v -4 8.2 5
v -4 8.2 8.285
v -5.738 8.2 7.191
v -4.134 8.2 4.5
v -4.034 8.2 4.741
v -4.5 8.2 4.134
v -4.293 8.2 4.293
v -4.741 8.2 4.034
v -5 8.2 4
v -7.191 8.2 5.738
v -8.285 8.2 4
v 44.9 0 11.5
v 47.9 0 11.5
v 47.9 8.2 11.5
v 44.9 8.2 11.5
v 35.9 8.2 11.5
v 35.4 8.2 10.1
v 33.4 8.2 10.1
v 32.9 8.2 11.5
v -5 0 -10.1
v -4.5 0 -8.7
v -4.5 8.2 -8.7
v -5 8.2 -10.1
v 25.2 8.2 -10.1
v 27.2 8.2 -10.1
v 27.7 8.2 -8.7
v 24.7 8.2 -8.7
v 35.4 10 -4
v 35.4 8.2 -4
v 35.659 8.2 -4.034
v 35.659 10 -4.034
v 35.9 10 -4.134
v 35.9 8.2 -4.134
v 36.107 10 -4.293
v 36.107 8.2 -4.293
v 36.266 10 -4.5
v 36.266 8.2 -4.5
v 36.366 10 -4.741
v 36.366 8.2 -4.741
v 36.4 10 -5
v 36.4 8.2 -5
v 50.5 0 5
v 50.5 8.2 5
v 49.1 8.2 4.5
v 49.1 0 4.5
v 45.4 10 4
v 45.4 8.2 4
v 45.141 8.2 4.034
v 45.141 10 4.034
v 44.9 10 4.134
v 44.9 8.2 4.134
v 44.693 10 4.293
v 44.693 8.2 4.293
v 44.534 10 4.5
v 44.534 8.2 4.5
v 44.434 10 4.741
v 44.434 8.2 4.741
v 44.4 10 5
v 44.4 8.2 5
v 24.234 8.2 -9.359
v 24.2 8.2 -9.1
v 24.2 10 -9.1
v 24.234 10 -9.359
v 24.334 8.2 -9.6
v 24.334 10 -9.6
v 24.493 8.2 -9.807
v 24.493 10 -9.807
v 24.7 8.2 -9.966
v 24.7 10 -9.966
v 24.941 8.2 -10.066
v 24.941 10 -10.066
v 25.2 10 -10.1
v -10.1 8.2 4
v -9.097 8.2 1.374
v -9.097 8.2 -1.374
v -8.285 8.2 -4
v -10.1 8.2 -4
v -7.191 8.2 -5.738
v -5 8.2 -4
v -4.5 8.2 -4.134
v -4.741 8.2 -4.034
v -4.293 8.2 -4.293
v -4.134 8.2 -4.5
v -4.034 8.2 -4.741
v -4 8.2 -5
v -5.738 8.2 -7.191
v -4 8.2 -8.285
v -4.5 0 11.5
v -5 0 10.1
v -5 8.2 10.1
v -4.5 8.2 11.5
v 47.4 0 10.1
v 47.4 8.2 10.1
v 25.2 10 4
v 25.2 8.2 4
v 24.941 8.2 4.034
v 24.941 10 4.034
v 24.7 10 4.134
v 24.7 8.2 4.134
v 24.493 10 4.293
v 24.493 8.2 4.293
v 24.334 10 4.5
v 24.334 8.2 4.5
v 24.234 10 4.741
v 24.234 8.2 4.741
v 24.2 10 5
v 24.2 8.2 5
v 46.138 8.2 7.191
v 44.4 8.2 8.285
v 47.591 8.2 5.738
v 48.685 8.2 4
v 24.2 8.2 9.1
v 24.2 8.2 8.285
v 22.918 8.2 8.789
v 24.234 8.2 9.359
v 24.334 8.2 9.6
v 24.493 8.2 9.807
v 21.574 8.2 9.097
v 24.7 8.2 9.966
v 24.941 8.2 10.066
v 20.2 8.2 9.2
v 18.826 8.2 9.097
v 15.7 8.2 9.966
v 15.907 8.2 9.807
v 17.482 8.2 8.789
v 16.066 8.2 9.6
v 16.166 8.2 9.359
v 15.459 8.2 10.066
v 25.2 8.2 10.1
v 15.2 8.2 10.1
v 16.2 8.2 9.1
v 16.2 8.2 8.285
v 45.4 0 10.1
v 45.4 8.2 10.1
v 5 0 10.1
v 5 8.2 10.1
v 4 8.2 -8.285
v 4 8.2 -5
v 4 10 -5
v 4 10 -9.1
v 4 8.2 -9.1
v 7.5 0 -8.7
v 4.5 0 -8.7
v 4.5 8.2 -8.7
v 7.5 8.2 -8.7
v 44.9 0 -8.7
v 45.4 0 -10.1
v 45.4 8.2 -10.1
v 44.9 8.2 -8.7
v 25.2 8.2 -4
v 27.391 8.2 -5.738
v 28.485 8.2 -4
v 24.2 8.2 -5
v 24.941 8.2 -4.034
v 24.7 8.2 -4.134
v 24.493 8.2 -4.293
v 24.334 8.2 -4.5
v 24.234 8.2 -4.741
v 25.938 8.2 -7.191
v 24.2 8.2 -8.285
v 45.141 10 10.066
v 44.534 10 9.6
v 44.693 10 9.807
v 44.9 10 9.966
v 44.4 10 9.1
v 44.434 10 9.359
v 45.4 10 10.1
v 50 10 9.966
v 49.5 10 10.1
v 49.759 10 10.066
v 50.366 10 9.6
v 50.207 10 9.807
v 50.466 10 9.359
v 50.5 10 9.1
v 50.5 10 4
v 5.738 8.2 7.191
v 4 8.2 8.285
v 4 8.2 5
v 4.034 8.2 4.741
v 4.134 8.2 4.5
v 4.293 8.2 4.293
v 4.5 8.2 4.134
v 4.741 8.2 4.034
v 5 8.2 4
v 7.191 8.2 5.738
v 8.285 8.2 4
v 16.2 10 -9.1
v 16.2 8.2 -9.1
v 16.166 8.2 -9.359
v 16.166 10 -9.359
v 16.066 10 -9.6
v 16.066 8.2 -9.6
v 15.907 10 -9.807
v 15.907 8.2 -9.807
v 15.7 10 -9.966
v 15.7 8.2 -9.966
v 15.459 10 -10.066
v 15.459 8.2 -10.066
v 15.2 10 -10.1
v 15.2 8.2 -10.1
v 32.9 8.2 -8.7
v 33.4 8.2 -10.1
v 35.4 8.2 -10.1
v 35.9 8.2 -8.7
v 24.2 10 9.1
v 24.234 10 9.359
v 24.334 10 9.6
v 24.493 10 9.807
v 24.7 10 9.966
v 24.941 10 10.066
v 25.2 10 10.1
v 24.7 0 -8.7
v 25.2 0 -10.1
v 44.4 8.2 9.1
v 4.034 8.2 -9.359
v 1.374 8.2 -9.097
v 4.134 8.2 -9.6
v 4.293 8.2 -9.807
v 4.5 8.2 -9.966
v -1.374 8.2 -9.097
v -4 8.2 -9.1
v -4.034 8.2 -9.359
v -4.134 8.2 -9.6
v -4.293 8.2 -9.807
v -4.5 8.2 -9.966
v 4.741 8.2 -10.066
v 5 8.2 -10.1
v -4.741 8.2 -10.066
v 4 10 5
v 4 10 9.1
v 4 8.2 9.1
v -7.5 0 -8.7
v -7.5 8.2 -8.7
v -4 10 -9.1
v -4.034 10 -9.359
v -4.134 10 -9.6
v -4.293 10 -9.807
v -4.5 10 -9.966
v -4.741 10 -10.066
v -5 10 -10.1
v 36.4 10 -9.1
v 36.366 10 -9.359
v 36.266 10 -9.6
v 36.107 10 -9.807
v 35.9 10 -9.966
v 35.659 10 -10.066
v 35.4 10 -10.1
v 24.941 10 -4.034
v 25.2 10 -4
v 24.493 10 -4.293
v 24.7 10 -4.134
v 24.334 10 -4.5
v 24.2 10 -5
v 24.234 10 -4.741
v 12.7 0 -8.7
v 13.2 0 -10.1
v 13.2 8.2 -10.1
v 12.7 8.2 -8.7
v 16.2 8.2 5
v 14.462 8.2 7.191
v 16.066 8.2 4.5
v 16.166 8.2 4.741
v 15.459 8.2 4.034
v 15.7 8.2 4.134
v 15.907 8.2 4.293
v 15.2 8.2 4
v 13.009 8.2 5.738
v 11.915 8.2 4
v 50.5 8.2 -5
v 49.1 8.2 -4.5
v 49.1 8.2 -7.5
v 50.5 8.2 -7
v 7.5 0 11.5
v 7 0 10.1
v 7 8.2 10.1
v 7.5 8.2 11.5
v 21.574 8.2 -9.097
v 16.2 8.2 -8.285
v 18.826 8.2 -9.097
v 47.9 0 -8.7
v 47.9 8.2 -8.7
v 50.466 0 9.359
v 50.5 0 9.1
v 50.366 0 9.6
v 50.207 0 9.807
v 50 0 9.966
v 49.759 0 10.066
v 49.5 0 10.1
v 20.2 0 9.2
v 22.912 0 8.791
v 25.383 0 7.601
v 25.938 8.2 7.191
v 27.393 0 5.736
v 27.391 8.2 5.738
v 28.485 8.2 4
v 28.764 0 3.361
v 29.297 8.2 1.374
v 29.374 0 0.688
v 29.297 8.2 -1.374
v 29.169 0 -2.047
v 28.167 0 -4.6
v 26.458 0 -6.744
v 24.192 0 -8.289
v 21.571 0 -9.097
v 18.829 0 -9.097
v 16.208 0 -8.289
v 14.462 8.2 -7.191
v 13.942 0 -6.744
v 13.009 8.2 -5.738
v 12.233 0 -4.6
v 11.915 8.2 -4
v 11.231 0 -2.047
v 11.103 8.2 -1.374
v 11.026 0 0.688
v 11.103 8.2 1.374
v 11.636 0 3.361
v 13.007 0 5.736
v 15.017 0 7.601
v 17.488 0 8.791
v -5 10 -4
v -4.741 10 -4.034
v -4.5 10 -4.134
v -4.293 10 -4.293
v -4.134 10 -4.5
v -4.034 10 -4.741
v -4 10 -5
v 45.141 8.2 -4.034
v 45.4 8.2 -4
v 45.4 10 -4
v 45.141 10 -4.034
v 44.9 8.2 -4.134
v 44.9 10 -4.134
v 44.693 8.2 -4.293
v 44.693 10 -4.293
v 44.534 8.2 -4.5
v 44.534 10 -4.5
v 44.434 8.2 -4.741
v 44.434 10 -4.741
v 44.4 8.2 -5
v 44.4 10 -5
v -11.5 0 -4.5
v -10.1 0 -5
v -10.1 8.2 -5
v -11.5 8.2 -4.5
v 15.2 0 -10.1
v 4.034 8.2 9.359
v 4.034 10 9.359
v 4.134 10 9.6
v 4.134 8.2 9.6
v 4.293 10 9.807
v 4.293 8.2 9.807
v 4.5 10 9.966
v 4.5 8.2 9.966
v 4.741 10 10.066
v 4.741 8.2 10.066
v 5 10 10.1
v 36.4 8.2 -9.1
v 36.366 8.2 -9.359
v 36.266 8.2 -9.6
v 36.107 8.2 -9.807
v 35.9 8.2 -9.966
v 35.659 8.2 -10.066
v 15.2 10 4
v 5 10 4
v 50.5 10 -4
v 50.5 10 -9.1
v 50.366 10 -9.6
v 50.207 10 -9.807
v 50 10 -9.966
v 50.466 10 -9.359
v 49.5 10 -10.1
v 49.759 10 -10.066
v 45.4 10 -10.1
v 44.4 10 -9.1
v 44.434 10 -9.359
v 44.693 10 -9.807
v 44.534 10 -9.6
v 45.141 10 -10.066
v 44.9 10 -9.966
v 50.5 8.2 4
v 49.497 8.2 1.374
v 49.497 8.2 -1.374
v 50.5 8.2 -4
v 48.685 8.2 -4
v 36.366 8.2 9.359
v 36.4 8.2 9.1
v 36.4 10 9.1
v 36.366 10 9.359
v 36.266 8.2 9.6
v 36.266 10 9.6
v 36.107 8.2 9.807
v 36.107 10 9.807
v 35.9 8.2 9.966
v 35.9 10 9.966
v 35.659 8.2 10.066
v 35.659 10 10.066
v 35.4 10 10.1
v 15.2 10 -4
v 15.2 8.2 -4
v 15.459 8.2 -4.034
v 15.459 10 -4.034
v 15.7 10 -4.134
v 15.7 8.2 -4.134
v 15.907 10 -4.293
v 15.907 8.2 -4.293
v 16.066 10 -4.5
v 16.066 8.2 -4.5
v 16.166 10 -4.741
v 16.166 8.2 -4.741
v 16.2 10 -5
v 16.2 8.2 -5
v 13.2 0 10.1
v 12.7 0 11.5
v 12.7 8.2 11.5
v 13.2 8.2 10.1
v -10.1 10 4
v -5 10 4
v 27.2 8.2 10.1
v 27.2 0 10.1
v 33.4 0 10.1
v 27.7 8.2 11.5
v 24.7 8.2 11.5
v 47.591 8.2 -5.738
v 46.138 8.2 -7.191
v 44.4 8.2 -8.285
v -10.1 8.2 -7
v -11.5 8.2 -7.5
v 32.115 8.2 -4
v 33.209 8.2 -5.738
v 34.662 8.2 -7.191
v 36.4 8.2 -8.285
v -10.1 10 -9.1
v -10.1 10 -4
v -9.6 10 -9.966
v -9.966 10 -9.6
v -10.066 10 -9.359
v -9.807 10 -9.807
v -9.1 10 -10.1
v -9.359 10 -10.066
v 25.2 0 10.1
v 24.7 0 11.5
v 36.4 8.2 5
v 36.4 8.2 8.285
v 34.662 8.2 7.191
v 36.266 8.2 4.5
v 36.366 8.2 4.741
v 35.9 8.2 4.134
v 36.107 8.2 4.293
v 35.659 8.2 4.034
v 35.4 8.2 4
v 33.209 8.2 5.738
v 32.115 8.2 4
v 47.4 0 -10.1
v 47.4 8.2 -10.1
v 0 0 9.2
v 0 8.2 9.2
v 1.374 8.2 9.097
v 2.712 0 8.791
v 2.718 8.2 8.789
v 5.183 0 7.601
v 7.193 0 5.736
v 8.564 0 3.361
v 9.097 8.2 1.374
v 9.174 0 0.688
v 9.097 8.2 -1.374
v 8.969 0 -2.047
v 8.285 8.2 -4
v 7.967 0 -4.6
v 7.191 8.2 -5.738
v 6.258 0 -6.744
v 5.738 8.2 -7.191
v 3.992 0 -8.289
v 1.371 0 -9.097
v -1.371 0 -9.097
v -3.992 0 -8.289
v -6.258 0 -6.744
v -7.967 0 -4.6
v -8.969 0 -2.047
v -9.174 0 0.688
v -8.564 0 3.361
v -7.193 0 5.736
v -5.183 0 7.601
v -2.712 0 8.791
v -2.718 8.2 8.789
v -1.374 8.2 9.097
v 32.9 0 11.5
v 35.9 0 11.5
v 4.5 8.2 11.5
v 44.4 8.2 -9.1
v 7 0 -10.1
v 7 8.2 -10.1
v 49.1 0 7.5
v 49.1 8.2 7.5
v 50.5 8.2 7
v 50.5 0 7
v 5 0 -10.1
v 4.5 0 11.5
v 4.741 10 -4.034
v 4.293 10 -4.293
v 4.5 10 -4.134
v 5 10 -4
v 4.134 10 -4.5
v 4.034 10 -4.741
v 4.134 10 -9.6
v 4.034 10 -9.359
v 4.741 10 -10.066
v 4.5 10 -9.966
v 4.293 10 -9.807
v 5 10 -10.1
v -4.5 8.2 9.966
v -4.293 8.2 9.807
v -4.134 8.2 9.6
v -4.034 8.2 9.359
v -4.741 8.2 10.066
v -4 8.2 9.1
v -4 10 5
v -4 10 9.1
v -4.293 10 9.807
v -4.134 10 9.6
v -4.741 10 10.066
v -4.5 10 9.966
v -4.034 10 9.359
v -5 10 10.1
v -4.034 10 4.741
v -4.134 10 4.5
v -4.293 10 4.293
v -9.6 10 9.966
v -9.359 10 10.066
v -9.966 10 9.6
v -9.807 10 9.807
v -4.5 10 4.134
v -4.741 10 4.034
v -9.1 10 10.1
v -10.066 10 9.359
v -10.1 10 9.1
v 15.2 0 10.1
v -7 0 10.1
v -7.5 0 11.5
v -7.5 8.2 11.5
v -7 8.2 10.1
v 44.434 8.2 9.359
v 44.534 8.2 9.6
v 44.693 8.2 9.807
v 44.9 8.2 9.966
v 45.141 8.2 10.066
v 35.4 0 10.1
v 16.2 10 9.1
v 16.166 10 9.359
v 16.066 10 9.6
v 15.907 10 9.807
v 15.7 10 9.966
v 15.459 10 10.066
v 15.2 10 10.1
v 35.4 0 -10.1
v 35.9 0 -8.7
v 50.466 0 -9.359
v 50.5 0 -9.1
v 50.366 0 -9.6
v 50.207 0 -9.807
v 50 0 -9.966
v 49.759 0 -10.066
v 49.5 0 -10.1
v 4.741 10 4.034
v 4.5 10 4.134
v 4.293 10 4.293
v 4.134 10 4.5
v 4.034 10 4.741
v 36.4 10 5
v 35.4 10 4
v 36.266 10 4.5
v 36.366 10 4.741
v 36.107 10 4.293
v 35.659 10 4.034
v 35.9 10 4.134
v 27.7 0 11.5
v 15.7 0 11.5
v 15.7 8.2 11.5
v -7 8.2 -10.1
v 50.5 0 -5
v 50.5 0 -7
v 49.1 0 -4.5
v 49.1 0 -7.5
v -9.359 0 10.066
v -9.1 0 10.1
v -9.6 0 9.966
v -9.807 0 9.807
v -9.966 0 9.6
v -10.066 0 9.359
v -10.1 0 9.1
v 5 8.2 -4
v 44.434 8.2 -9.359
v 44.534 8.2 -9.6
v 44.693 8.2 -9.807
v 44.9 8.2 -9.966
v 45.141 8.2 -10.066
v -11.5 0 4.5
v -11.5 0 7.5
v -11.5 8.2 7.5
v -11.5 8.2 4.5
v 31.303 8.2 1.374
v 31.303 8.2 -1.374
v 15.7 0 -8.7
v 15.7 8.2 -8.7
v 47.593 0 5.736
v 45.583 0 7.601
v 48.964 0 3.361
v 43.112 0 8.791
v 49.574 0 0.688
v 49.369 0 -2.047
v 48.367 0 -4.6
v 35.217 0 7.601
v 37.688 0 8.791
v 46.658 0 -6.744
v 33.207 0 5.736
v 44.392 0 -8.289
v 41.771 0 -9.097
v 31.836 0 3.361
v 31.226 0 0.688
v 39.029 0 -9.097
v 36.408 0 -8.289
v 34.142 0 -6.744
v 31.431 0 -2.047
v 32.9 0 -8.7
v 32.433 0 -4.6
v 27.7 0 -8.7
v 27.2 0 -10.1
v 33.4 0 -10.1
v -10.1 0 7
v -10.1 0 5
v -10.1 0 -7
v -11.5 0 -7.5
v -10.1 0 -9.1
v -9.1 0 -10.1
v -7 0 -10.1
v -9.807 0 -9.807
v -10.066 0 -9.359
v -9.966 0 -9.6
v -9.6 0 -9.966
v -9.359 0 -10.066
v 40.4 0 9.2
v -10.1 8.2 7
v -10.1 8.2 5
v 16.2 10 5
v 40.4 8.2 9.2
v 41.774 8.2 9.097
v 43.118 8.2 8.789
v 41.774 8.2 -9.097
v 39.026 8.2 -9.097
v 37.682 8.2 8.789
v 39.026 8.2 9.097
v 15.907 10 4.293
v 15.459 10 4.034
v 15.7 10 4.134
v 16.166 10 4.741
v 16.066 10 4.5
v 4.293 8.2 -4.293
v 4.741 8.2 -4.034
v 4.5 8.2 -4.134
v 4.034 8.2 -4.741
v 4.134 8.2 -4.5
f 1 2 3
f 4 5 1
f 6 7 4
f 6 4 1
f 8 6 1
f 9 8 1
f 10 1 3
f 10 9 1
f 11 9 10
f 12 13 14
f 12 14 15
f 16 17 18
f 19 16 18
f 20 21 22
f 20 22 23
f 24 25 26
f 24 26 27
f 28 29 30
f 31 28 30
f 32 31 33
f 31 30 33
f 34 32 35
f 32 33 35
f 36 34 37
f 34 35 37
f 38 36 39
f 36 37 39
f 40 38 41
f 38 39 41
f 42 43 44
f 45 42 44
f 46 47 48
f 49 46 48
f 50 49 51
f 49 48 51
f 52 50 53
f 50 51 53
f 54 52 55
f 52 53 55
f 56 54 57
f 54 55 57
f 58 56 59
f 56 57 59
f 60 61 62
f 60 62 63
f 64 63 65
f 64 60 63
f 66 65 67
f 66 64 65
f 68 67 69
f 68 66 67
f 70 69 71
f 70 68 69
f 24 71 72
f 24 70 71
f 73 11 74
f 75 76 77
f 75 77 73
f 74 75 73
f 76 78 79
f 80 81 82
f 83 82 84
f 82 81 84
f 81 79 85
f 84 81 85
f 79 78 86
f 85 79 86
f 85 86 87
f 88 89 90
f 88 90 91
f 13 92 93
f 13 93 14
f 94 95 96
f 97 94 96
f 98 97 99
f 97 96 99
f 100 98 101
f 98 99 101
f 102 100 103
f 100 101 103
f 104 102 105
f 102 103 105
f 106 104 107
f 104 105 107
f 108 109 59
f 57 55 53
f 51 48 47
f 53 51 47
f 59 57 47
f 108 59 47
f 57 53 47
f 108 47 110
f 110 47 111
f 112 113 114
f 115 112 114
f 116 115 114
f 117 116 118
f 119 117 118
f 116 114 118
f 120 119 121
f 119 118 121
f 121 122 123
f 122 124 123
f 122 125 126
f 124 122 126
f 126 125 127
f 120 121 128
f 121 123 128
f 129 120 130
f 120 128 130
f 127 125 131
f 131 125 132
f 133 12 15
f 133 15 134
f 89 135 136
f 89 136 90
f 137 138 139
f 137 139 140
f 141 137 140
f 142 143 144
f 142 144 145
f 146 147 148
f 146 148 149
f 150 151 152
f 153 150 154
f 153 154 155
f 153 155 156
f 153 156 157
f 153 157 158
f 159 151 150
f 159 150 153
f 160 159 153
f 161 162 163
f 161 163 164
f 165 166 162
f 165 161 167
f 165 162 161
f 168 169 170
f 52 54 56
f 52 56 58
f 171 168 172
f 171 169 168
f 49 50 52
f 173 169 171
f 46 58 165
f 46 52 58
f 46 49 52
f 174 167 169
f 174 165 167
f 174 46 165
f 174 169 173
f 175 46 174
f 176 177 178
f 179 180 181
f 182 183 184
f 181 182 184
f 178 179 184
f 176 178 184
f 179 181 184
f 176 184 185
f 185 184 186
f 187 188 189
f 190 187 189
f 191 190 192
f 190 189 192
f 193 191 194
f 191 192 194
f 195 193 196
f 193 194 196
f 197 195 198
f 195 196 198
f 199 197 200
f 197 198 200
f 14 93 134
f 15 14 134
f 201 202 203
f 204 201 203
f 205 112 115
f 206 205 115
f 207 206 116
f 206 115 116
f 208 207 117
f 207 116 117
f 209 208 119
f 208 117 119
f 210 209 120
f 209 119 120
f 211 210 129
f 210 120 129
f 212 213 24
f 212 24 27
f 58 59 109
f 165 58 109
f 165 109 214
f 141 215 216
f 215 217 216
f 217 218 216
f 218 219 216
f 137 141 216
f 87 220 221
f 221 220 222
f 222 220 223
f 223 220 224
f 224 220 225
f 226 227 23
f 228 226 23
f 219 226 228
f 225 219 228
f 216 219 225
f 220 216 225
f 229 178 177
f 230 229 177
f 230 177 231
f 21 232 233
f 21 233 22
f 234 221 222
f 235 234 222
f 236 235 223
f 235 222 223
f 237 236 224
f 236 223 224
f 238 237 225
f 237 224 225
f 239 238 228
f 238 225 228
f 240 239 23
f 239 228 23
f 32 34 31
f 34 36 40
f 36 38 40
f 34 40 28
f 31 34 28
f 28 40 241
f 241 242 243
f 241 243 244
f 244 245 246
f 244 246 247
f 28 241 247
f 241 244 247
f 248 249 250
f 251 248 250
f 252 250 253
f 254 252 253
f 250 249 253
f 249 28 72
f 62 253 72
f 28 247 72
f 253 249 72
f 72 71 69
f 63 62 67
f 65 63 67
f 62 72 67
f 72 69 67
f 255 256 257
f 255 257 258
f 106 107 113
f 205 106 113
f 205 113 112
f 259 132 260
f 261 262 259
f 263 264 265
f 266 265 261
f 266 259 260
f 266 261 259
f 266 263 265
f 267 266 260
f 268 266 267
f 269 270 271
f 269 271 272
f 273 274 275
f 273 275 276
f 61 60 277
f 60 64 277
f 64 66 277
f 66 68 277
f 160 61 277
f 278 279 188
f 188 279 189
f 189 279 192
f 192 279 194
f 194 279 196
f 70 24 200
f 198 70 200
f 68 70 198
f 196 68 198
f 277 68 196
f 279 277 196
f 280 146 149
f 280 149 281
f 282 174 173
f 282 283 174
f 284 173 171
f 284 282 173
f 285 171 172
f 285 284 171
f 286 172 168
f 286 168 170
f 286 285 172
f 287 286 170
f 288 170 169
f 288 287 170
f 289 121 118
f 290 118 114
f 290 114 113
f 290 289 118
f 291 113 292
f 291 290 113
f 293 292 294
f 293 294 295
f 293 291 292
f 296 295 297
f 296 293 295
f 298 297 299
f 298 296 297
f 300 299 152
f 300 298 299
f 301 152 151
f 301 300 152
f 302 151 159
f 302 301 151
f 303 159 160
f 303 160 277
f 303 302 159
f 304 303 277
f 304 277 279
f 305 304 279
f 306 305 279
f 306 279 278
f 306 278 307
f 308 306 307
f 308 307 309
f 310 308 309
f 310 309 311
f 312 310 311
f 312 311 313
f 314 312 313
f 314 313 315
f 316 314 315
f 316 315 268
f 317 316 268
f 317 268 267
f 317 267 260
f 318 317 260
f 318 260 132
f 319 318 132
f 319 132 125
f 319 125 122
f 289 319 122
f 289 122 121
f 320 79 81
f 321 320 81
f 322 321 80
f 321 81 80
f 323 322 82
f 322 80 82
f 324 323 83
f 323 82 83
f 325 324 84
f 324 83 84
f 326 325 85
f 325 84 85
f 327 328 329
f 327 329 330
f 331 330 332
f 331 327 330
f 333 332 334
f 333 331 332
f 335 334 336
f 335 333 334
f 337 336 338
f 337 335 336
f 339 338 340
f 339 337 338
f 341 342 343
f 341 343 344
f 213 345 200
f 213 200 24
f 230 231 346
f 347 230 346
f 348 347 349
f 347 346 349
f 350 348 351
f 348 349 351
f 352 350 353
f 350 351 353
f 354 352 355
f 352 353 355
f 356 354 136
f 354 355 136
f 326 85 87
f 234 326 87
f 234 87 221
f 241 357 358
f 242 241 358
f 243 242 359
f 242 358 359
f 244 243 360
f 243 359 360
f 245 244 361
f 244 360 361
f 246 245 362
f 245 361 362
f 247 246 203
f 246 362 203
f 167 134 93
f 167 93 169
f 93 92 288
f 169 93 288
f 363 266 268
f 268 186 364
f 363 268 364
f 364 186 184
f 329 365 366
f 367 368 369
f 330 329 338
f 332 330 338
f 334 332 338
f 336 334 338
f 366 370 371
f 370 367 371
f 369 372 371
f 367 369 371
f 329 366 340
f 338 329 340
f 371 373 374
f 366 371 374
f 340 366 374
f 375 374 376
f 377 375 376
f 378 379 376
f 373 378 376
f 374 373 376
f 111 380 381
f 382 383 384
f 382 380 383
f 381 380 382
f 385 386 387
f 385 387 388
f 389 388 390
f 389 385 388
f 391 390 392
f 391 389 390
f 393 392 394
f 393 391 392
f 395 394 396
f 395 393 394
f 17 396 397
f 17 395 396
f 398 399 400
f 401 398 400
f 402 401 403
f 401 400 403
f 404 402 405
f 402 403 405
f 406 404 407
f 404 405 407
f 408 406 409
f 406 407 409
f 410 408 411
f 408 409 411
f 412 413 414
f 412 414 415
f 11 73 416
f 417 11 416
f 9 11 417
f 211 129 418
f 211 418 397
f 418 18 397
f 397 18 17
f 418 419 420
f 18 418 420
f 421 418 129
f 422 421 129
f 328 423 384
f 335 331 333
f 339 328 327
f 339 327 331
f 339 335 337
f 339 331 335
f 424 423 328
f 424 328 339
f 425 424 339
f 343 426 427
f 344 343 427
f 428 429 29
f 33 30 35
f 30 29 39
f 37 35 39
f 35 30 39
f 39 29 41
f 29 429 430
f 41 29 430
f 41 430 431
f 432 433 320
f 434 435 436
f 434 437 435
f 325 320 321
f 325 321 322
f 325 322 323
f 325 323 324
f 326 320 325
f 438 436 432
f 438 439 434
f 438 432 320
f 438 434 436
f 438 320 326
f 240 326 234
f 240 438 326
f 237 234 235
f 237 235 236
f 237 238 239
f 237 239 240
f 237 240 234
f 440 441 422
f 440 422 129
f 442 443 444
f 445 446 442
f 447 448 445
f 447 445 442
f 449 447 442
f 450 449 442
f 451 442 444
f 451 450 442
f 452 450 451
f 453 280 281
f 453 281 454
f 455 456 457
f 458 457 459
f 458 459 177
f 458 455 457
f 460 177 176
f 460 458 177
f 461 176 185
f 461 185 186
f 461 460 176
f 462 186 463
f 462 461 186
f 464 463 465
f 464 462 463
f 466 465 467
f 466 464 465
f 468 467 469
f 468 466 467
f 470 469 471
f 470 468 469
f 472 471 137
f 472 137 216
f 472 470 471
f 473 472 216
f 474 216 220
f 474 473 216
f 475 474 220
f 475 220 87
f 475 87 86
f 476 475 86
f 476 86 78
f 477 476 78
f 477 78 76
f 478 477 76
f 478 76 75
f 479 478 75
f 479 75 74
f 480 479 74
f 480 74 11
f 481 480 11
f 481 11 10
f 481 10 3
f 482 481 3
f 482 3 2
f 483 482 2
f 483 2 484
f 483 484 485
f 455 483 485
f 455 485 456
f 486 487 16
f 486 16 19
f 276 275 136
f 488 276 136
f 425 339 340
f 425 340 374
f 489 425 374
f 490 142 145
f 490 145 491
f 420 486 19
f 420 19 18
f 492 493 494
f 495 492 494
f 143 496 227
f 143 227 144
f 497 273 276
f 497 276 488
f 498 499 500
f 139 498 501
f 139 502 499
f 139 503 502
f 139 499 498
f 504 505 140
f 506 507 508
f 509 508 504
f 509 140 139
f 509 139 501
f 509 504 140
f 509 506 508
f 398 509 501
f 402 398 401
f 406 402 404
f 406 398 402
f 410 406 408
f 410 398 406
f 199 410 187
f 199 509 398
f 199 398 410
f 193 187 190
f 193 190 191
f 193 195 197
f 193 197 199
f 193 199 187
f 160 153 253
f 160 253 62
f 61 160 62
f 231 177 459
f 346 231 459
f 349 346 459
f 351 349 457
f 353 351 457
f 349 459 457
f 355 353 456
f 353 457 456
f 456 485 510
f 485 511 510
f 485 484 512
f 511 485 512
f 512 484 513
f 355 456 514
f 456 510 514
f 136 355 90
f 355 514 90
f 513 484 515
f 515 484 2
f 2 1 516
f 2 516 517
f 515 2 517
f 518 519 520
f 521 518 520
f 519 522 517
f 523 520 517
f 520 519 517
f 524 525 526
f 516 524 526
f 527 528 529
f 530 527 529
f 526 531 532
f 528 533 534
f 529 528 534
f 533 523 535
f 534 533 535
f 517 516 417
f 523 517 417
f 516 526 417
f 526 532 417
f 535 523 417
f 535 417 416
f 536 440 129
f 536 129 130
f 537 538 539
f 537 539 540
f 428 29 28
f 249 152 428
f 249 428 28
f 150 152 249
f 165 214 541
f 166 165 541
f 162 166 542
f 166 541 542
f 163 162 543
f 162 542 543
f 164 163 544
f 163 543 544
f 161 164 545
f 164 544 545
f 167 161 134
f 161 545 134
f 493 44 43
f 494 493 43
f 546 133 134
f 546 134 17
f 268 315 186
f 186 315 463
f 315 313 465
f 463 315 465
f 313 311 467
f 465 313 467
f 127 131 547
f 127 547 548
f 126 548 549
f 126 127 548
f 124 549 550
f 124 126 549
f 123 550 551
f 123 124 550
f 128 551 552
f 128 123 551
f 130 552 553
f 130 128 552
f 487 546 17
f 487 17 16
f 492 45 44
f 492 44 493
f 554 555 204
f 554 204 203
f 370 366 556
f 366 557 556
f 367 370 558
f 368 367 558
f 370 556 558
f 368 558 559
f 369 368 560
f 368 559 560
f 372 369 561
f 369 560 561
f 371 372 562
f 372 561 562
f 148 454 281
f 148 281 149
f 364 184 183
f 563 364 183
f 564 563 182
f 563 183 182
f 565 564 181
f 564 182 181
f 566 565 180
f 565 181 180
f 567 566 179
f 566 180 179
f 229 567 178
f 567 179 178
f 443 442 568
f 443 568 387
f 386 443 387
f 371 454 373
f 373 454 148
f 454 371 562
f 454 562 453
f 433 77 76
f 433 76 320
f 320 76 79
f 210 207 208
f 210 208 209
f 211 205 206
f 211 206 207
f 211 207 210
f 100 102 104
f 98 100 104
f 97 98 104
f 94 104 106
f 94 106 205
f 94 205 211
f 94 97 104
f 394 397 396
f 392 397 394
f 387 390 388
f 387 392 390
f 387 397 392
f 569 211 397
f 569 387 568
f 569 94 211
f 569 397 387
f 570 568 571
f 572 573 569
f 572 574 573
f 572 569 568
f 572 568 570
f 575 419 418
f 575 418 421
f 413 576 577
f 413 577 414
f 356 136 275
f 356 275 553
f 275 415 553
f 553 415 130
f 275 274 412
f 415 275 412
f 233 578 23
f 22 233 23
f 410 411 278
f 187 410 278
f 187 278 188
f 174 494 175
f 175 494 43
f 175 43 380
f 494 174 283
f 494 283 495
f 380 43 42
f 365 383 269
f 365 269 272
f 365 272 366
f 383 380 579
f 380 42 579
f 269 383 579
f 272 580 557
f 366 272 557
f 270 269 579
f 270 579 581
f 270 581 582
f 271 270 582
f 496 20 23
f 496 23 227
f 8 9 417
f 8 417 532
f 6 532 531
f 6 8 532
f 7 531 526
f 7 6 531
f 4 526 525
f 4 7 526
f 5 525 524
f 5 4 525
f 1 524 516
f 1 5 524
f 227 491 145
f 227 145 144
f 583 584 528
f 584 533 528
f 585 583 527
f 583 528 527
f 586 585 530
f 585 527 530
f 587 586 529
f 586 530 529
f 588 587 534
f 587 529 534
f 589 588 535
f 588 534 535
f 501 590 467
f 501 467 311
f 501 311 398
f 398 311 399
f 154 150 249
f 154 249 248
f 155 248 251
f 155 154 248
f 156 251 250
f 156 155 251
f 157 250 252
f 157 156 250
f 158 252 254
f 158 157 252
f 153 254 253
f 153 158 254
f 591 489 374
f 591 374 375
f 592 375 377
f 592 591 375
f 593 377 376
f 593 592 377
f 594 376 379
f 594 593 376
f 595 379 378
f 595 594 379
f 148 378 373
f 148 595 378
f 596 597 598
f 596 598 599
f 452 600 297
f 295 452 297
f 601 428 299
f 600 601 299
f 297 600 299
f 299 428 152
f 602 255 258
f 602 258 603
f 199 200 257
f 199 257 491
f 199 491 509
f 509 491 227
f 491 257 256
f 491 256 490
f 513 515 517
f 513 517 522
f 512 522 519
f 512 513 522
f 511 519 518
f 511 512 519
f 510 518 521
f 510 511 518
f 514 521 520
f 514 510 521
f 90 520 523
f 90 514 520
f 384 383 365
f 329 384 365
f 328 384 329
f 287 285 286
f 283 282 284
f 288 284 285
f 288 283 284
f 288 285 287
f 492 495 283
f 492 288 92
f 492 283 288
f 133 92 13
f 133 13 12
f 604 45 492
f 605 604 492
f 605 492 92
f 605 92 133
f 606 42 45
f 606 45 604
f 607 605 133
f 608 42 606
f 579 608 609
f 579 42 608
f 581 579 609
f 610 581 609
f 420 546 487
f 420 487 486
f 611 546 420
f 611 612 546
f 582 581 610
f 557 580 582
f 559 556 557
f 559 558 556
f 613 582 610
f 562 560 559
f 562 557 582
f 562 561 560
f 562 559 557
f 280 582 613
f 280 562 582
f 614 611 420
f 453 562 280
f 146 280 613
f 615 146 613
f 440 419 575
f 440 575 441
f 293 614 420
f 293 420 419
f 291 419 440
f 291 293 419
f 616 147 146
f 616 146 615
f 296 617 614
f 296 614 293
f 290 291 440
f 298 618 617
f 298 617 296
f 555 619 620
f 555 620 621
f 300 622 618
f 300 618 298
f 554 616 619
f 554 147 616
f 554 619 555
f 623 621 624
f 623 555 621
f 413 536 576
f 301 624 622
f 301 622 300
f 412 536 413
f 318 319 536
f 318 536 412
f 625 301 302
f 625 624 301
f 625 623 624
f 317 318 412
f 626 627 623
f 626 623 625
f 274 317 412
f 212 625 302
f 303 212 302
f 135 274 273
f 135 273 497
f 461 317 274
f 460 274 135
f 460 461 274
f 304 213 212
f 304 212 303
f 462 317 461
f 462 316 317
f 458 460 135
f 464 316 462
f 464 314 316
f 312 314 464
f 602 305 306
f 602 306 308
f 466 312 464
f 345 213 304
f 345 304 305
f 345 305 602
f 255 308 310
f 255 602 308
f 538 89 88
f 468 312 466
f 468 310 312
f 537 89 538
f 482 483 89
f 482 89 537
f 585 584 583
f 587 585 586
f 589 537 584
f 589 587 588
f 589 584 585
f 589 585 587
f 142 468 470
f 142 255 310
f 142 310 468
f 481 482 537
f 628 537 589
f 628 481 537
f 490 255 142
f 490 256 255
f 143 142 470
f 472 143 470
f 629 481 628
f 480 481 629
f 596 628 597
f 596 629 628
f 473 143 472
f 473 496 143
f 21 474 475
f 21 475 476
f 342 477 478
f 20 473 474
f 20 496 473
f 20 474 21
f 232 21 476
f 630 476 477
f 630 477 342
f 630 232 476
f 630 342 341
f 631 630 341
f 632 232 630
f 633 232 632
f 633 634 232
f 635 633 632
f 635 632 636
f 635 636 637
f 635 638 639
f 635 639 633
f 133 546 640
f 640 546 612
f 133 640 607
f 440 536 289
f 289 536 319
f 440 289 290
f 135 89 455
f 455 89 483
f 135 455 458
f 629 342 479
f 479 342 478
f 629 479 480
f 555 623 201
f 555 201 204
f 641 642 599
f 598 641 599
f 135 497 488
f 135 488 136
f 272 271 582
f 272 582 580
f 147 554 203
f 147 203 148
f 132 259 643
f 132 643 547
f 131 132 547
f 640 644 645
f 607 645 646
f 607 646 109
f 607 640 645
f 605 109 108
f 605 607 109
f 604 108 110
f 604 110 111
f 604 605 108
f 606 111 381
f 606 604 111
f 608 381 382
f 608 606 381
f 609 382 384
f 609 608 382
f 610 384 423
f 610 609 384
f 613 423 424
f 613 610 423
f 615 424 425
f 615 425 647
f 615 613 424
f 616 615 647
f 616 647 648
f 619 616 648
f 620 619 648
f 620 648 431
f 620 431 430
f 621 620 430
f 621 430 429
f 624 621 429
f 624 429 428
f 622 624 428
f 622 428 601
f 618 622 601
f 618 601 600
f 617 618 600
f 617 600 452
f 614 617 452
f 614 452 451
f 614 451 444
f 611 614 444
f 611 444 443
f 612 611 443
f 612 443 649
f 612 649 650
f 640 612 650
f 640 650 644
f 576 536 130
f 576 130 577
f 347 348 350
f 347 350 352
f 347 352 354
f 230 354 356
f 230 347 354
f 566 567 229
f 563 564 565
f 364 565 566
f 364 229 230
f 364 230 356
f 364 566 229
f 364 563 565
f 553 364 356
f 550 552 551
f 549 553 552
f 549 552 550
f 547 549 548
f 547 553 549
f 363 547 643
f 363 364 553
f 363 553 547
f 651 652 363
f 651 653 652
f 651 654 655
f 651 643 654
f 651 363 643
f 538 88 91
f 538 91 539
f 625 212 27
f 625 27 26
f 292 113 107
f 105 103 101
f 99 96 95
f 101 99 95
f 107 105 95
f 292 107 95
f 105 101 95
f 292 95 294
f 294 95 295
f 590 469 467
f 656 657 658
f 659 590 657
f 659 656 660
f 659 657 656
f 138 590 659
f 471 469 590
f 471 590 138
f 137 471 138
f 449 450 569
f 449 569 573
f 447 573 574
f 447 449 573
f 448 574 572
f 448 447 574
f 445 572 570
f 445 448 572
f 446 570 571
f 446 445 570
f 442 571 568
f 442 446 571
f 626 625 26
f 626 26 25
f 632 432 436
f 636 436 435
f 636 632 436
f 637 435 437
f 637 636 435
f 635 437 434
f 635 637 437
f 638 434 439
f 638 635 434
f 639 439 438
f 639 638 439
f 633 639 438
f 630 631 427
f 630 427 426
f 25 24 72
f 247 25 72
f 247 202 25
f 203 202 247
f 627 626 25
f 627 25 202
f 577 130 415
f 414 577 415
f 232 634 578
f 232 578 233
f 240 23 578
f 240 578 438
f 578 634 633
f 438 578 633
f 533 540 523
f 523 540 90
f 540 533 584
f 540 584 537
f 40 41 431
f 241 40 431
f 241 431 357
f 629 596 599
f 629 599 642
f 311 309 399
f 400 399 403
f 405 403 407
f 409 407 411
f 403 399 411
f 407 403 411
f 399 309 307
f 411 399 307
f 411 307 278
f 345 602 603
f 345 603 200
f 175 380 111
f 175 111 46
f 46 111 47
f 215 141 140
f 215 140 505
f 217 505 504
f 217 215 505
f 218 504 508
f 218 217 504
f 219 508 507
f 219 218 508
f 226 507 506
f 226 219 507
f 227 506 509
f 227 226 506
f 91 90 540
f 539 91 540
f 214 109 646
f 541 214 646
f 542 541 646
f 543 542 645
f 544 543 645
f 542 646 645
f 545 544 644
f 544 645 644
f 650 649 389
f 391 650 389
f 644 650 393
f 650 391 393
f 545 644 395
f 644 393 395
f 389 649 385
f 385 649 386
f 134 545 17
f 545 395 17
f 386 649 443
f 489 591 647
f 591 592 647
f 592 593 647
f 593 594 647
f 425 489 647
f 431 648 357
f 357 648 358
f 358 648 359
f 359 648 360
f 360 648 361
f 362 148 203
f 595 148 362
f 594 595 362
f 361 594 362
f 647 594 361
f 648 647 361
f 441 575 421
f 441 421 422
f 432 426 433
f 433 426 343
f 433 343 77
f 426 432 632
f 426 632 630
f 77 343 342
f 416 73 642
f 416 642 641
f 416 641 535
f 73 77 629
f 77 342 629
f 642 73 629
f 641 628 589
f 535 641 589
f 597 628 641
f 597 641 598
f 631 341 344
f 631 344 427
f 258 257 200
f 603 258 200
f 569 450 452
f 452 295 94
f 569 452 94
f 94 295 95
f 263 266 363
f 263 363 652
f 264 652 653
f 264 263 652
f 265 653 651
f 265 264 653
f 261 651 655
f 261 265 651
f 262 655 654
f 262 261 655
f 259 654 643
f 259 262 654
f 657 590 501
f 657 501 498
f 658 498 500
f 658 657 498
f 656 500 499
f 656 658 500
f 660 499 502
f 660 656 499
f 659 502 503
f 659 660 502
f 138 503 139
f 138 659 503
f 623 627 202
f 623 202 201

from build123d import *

# Parameters (mm, degrees)
SKETCH1_R           = 9.2
BOSS_EXTRUDE1_DEPTH = 8.2
BOSS_EXTRUDE2_DEPTH = 1.8
LPATTERN1_COUNT     = 3
LPATTERN1_PITCH     = 20.2
FILLET1_R           = 1
CUT_EXTRUDE1_DEPTH  = 8.2


with BuildPart() as part:
    # Sketch1 → Boss-Extrude1 (new body)
    with BuildSketch(Plane(origin=(0, 0, 0), x_dir=(1, 0, 0), z_dir=(0, 1, 0))):
        Polygon((-9.1, 10.1), (-7, 10.1), (-7.5, 8.7), (-4.5, 8.7), (-5, 10.1), (5, 10.1), (4.5, 8.7), (7.5, 8.7), (7, 10.1), (9.1, 10.1), (10.1, 10.1), (10.1, 9.1), (10.1, 7), (10.1, 5), (10.1, -5), (10.1, -7), (10.1, -9.1), (10.1, -10.1), (9.1, -10.1), (7, -10.1), (7.5, -11.5), (4.5, -11.5), (5, -10.1), (-5, -10.1), (-4.5, -11.5), (-7.5, -11.5), (-7, -10.1), (-9.1, -10.1), (-10.1, -10.1), (-10.1, -9.1), (-10.1, -7), (-11.5, -7.5), (-11.5, -4.5), (-10.1, -5), (-10.1, 5), (-11.5, 4.5), (-11.5, 7.5), (-10.1, 7), (-10.1, 9.1), (-10.1, 10.1), align=None)
        with Locations(Location((0, 0, 0), (0, 0, 270))):
            Circle(SKETCH1_R, mode=Mode.SUBTRACT)
    boss_extrude1 = extrude(amount=BOSS_EXTRUDE1_DEPTH)

    # Sketch2 → Boss-Extrude2 (add)
    with BuildSketch(Plane(origin=(0, 8.2, 0), x_dir=(1, 0, 0), z_dir=(0, 1, 0))):
        with BuildLine():
            Line((-9.1, 4), (-5, 4))
            ThreePointArc((-5, 4), (-4.292893219, 4.292893219), (-4, 5))
            Line((-4, 5), (-4, 9.1))
            ThreePointArc((-4, 9.1), (-4.292893219, 9.807106781), (-5, 10.1))
            Line((-5, 10.1), (-9.1, 10.1))
            Line((-9.1, 10.1), (-10.1, 10.1))
            Line((-10.1, 10.1), (-10.1, 9.1))
            Line((-10.1, 9.1), (-10.1, 5))
            Line((-10.1, 5), (-10.1, 4))
            Line((-10.1, 4), (-9.1, 4))
        make_face()
        with BuildLine():
            Line((9.1, 10.1), (10.1, 10.1))
            Line((10.1, 10.1), (10.1, 4))
            Line((10.1, 4), (9.1, 4))
            Line((9.1, 4), (5, 4))
            ThreePointArc((5, 4), (4.292893219, 4.292893219), (4, 5))
            Line((4, 5), (4, 9.1))
            ThreePointArc((4, 9.1), (4.292893219, 9.807106781), (5, 10.1))
            Line((5, 10.1), (9.1, 10.1))
        make_face()
        with BuildLine():
            Line((9.1, -4), (5, -4))
            ThreePointArc((5, -4), (4.292893219, -4.292893219), (4, -5))
            Line((4, -5), (4, -9.1))
            ThreePointArc((4, -9.1), (4.292893219, -9.807106781), (5, -10.1))
            Line((5, -10.1), (9.1, -10.1))
            Line((9.1, -10.1), (10.1, -10.1))
            Line((10.1, -10.1), (10.1, -4))
            Line((10.1, -4), (9.1, -4))
        make_face()
        with BuildLine():
            Line((-4, -5), (-4, -9.1))
            ThreePointArc((-4, -9.1), (-4.292893219, -9.807106781), (-5, -10.1))
            Line((-5, -10.1), (-9.1, -10.1))
            Line((-9.1, -10.1), (-10.1, -10.1))
            Line((-10.1, -10.1), (-10.1, -9.1))
            Line((-10.1, -9.1), (-10.1, -5))
            Line((-10.1, -5), (-10.1, -4))
            Line((-10.1, -4), (-9.1, -4))
            Line((-9.1, -4), (-5, -4))
            ThreePointArc((-5, -4), (-4.292893219, -4.292893219), (-4, -5))
        make_face()
    boss_extrude2 = extrude(amount=BOSS_EXTRUDE2_DEPTH)

    # LPattern1: Boss-Extrude1, Boss-Extrude2 ×3
    with Locations(*[(i * LPATTERN1_PITCH, 0, 0) for i in range(1, LPATTERN1_COUNT)]):
        add(boss_extrude1)
        add(boss_extrude2)

    # Fillet1
    fillet1_edges = [part.edges().sort_by_distance(p)[0] for p in [
        (50.5, 5, 10.1),
        (50.5, 5, -10.1),
        (-10.1, 5, 10.1),
        (-10.1, 5, -10.1),
    ]]
    fillet(fillet1_edges, radius=FILLET1_R)

    # Sketch5 → Cut-Extrude1 (cut)
    with BuildSketch(Plane.XZ):
        Polygon((50.5, -5), (49.1, -4.5), (49.1, -7.5), (50.5, -7), align=None)
    cut_extrude1 = extrude(amount=-CUT_EXTRUDE1_DEPTH, mode=Mode.SUBTRACT)

    # Mirror1: Cut-Extrude1 across plane
    add(cut_extrude1.mirror(Plane.XY), mode=Mode.SUBTRACT)


solid = part.part
